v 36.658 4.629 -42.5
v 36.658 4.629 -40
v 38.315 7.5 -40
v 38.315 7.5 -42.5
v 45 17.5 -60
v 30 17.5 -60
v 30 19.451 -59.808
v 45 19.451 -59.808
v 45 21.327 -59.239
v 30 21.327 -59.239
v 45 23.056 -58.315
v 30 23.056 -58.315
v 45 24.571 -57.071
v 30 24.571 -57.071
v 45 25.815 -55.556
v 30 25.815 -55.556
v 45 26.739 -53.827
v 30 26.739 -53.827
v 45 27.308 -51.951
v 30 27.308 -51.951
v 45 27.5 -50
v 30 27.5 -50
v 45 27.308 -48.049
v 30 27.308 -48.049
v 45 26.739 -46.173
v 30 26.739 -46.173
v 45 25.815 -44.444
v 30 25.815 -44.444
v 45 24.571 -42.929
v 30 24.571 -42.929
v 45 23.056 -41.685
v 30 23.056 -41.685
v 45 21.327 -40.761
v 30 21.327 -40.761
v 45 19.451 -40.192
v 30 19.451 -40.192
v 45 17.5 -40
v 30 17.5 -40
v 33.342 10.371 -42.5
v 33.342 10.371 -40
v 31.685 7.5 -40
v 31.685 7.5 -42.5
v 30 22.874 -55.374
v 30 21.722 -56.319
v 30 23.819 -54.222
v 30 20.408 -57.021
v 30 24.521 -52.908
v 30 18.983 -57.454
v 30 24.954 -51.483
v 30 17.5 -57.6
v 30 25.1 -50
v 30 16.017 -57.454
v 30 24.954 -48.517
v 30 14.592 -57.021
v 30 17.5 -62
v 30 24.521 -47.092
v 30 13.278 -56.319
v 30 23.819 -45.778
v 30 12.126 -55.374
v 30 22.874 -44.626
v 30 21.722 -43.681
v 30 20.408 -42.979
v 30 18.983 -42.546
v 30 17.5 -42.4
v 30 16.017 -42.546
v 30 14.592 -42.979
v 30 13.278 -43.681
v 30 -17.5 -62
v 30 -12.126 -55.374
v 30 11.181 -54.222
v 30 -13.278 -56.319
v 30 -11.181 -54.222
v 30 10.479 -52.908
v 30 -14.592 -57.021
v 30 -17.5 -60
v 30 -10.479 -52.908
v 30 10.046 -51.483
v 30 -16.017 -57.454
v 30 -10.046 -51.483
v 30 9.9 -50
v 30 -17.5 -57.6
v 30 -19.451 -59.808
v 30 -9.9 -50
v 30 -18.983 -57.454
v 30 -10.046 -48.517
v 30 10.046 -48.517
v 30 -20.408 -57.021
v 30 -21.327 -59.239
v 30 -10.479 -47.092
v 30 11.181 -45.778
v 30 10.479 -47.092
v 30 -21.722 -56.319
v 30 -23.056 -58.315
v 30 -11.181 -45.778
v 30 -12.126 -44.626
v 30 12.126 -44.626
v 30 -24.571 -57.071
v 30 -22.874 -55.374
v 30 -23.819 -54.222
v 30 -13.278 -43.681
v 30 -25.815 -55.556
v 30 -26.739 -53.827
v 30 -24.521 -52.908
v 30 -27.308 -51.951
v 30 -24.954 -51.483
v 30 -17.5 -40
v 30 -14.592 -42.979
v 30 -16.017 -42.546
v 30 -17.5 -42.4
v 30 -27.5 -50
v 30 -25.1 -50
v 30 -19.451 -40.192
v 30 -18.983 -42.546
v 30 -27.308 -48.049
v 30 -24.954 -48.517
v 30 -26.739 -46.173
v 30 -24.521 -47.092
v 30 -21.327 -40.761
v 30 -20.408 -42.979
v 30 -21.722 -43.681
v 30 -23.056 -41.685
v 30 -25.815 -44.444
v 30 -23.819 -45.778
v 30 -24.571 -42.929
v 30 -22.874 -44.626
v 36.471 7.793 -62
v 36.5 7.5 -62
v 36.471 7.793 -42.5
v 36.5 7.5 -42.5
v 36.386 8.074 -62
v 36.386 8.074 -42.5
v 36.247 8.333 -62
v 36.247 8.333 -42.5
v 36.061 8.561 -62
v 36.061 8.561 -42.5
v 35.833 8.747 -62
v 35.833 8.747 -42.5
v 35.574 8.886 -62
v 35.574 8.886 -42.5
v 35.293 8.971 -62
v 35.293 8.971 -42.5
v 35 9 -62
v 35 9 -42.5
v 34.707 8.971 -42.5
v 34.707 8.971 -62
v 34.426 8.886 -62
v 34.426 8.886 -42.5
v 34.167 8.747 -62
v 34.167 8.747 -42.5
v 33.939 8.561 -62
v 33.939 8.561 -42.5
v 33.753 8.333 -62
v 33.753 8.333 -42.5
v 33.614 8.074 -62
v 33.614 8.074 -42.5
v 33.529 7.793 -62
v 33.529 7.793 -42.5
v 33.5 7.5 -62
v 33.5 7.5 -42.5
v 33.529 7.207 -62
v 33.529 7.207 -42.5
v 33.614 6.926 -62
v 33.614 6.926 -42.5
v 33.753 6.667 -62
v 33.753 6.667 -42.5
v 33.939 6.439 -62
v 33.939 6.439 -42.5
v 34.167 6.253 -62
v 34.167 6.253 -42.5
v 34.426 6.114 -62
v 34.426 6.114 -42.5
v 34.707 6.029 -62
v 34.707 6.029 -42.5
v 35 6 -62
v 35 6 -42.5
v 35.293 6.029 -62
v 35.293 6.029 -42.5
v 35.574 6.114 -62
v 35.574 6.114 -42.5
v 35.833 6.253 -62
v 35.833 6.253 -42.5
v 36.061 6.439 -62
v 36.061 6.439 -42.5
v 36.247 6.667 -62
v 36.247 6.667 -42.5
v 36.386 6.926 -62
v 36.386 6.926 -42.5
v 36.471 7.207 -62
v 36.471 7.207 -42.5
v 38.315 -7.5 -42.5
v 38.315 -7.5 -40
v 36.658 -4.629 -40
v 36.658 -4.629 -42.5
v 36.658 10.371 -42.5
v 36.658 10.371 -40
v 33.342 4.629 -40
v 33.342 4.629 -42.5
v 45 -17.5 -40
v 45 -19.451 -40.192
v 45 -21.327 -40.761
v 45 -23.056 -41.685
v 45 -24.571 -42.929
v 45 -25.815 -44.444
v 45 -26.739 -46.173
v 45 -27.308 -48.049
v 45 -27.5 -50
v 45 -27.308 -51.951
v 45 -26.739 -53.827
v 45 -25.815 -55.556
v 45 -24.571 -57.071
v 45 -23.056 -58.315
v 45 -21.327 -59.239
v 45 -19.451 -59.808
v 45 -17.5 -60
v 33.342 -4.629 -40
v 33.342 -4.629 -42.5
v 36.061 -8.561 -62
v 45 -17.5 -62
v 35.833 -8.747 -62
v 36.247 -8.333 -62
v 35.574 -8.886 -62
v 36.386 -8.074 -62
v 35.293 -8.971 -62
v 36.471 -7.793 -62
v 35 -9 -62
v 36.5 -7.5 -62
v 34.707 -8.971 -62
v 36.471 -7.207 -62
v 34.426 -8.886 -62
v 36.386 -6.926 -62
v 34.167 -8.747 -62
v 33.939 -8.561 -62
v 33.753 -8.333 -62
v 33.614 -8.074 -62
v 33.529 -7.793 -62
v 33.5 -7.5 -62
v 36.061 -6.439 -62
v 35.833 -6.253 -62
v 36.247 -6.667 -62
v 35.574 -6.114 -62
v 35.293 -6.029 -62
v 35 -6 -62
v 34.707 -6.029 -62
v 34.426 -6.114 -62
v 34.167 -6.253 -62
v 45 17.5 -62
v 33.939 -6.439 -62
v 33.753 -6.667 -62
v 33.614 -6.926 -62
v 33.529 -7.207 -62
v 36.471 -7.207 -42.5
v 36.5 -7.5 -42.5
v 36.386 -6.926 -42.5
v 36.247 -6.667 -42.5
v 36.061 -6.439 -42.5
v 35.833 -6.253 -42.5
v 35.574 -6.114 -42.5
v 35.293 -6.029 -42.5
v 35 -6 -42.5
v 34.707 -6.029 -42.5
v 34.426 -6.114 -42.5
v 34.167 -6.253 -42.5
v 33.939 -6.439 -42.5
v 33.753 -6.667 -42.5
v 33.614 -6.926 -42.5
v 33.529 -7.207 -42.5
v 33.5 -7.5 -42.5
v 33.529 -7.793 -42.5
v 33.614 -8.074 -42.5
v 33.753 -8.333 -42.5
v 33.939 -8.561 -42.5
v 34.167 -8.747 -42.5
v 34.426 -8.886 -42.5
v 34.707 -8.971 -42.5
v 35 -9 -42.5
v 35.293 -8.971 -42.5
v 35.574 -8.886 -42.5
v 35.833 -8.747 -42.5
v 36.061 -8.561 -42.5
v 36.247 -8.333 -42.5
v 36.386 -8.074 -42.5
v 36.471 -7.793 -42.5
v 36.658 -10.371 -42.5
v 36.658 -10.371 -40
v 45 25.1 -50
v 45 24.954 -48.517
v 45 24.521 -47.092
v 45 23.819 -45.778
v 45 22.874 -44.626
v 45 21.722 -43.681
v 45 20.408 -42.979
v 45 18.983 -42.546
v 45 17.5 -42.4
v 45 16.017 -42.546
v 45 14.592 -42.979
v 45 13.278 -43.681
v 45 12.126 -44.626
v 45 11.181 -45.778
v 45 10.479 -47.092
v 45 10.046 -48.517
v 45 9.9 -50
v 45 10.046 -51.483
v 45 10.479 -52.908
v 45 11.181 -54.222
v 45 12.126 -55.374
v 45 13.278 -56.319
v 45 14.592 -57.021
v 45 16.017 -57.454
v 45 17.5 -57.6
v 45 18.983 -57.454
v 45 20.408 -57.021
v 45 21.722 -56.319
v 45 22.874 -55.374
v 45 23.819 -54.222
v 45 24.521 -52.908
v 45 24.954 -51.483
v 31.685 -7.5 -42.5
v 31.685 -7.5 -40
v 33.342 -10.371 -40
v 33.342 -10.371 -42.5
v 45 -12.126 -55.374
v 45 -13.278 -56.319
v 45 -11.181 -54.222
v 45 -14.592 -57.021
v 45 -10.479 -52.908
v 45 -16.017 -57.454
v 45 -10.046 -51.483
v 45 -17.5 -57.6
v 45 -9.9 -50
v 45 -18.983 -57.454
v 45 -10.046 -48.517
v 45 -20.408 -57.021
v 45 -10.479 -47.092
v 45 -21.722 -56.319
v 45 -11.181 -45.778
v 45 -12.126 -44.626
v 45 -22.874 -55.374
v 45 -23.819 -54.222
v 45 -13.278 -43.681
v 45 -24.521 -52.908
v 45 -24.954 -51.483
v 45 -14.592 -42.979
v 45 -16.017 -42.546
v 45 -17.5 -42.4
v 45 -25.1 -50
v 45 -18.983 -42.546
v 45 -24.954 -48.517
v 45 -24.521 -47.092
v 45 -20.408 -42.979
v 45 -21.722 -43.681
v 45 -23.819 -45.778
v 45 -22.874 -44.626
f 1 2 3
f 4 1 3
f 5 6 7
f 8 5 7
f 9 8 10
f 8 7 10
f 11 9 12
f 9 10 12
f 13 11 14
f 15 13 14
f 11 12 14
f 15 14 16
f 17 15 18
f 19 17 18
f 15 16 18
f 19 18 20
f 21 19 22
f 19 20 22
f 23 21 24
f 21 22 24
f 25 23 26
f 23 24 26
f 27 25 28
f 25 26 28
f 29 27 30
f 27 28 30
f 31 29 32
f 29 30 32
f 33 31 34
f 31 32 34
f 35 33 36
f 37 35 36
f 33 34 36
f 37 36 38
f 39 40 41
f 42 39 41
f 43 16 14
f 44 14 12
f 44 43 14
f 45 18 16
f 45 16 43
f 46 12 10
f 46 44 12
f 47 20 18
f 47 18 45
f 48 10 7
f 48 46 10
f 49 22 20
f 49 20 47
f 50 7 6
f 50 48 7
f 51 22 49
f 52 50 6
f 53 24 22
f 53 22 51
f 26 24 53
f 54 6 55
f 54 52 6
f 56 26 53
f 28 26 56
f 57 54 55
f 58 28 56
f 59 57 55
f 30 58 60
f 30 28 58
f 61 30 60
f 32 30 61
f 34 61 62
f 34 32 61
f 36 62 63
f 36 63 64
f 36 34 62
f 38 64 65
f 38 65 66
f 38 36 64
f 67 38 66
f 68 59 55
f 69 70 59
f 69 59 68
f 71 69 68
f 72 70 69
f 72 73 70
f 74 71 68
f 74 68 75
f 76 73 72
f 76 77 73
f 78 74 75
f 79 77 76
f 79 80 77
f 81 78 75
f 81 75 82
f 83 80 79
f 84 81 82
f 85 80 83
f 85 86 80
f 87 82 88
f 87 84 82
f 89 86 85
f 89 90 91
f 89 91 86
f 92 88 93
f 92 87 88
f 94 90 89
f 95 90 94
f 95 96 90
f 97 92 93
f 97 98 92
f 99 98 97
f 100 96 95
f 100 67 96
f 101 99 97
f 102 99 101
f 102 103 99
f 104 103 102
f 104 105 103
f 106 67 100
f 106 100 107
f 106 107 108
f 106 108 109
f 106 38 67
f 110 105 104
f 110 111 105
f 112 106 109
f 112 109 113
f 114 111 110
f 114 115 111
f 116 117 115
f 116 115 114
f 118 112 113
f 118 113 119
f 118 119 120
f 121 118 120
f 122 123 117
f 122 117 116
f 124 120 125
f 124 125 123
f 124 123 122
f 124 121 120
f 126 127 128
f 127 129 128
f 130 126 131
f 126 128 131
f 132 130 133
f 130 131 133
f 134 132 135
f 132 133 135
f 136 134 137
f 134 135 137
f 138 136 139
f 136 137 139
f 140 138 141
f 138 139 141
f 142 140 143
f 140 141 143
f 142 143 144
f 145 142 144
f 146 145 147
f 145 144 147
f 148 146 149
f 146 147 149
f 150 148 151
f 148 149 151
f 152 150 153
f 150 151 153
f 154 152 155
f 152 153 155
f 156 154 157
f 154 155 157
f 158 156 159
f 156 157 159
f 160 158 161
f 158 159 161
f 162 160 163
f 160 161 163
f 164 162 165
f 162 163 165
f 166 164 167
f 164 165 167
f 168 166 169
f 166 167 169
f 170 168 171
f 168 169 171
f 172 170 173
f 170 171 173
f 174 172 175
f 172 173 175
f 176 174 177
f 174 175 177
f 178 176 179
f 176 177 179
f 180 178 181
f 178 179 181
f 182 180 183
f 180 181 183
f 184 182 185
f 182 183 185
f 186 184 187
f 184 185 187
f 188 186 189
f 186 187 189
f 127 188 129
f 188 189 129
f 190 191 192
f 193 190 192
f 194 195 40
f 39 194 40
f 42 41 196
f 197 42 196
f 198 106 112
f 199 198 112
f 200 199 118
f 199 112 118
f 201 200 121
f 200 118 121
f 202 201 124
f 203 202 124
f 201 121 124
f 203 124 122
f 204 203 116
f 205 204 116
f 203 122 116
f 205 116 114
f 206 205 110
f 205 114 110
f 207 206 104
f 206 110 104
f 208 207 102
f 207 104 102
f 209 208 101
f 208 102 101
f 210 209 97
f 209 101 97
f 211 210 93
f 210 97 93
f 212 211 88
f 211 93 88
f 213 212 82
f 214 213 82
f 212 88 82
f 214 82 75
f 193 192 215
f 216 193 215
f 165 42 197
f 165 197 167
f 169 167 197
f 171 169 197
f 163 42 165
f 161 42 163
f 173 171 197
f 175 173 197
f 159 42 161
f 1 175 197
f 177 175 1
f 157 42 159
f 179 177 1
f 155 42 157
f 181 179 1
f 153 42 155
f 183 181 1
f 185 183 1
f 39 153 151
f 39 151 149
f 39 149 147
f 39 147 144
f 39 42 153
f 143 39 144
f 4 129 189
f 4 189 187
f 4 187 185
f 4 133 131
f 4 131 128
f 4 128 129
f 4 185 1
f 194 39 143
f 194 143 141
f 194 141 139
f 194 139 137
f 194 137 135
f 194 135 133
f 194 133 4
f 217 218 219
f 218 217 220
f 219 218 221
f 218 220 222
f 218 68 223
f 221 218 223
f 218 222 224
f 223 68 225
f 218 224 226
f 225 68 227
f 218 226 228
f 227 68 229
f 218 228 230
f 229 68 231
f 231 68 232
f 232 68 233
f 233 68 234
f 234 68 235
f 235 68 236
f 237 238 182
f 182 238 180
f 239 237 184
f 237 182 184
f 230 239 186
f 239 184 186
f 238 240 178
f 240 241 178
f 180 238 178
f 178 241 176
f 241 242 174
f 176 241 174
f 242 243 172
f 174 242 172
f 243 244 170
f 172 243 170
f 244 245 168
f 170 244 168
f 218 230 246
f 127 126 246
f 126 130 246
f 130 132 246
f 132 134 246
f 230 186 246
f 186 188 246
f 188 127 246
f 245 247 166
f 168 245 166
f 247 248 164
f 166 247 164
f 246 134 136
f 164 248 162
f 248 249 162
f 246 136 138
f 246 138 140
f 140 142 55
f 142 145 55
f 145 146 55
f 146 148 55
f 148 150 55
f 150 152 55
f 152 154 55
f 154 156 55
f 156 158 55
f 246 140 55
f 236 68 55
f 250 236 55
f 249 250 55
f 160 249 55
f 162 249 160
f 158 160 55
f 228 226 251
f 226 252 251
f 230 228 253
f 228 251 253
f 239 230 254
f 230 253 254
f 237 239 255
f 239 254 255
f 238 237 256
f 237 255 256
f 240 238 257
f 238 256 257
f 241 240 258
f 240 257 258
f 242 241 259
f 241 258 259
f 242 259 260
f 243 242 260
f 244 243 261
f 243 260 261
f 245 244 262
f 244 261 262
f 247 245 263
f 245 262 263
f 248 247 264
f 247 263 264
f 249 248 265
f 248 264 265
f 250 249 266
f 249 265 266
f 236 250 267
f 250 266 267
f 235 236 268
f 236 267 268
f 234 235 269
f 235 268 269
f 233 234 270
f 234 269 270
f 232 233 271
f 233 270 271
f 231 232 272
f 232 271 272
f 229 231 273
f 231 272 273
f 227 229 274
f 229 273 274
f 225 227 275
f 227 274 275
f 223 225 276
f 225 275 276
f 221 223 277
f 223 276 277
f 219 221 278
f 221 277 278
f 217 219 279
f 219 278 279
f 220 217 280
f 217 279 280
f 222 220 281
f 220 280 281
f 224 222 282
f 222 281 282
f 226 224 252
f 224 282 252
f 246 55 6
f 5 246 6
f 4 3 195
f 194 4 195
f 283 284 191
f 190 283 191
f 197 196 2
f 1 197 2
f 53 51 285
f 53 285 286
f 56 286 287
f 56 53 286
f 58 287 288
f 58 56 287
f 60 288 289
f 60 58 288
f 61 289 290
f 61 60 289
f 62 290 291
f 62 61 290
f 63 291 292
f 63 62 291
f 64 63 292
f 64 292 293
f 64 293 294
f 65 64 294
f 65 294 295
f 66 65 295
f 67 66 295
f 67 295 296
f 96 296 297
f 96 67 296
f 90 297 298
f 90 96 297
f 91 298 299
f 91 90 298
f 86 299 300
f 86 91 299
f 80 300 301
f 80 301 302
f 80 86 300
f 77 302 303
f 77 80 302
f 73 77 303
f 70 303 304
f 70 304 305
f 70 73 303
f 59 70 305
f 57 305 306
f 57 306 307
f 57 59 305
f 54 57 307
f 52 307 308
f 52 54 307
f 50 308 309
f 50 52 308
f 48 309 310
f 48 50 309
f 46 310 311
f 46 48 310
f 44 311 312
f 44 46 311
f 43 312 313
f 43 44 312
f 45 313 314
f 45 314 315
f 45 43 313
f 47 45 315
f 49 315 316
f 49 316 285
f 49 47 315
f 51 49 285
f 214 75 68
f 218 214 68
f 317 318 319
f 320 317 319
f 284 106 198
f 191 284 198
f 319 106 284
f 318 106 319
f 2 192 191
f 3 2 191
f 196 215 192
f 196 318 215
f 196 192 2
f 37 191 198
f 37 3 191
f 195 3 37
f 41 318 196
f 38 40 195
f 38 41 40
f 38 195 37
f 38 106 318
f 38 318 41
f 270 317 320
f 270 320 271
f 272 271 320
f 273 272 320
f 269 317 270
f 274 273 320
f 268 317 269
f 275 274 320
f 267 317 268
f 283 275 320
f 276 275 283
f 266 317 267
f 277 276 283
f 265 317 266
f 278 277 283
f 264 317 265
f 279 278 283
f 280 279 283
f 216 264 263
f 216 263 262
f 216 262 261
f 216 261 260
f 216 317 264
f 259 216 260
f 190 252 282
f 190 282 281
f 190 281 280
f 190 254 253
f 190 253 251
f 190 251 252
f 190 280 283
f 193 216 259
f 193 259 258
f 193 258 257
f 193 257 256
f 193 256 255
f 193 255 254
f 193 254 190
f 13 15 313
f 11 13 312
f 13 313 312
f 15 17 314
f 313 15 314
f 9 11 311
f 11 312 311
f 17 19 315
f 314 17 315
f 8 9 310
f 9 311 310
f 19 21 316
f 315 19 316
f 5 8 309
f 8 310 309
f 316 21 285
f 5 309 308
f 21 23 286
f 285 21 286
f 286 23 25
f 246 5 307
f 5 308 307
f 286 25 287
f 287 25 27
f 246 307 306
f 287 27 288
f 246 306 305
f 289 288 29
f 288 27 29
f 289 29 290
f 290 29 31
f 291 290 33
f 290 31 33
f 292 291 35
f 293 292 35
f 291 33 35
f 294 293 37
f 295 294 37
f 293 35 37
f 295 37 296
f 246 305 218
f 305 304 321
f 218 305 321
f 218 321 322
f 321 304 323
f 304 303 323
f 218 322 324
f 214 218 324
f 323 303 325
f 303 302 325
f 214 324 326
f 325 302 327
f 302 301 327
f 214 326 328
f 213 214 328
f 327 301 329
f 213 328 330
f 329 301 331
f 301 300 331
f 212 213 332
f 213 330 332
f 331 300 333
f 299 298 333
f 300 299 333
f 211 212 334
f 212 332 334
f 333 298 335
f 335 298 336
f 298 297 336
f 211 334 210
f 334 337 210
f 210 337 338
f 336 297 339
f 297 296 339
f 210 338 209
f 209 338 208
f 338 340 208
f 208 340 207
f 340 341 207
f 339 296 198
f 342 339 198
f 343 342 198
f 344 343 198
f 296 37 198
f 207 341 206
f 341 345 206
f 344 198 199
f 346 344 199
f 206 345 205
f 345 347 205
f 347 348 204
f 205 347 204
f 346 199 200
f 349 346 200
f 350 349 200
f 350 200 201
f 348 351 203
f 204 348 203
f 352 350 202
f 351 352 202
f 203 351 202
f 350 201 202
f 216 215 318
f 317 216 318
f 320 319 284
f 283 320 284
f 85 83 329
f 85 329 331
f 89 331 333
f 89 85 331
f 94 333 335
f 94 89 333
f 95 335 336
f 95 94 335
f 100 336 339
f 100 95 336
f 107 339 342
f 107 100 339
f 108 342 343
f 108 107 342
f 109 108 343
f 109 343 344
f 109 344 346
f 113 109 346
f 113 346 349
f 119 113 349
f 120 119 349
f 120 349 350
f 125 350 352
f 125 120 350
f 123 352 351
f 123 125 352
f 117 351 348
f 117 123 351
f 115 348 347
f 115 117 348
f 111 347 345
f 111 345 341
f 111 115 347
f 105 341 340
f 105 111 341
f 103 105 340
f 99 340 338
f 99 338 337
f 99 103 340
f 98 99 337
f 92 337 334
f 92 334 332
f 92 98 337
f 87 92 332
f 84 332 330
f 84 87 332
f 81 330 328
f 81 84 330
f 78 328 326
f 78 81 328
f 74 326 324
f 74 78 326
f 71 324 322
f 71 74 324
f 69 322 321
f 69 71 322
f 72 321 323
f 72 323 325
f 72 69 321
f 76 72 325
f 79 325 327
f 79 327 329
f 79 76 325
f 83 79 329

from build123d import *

# Parameters (mm, degrees)
SKETCH039_R          = 7.6
PAD012_DEPTH         = 15
SKETCH040_R          = 1.5
POCKET024_DEPTH      = 10.001
POCKET024_DEPTH_BACK = 12.001
POCKET025_DEPTH      = 2.5


with BuildPart() as part:
    # Sketch039 → Pad012 (new body)
    with BuildSketch(Plane.YZ):
        with BuildLine():
            Line((-17.5, 10), (17.5, 10))
            ThreePointArc((17.5, -10), (27.5, 0), (17.5, 10))
            Line((17.5, -12), (17.5, -10))
            Line((-17.5, -12), (17.5, -12))
            Line((-17.5, -10), (-17.5, -12))
            ThreePointArc((-17.5, 10), (-27.5, 0), (-17.5, -10))
        make_face()
        with Locations((17.5, 0)):
            Circle(SKETCH039_R, mode=Mode.SUBTRACT)
        with Locations((-17.5, 0)):
            Circle(SKETCH039_R, mode=Mode.SUBTRACT)
    extrude(amount=PAD012_DEPTH)

    # Sketch040 → Pocket024 (cut, two sides)
    with BuildSketch(Plane.XY) as pocket024_sk:
        with Locations((5, 7.5)):
            Circle(SKETCH040_R)
        with Locations((5, -7.5)):
            Circle(SKETCH040_R)
    extrude(amount=POCKET024_DEPTH, mode=Mode.SUBTRACT)
    extrude(pocket024_sk.sketch, amount=-POCKET024_DEPTH_BACK, mode=Mode.SUBTRACT)

    # Sketch041 → Pocket025 (cut)
    with BuildSketch(Plane.XY.offset(10)):
        Polygon((6.6575, 10.3708742135), (3.3425, 10.3708742135), (1.685, 7.5), (3.3425, 4.6291257865), (6.6575, 4.6291257865), (8.315, 7.5), align=None)
        Polygon((6.6575, -4.6291257865), (3.3425, -4.6291257865), (1.685, -7.5), (3.3425, -10.3708742135), (6.6575, -10.3708742135), (8.315, -7.5), align=None)
    extrude(amount=-POCKET025_DEPTH, mode=Mode.SUBTRACT)


with BuildPart() as part_1:
    # Body007 placement: moved
    add(part.part.moved(Location((30, 0, -50))))


solid = part_1.part
